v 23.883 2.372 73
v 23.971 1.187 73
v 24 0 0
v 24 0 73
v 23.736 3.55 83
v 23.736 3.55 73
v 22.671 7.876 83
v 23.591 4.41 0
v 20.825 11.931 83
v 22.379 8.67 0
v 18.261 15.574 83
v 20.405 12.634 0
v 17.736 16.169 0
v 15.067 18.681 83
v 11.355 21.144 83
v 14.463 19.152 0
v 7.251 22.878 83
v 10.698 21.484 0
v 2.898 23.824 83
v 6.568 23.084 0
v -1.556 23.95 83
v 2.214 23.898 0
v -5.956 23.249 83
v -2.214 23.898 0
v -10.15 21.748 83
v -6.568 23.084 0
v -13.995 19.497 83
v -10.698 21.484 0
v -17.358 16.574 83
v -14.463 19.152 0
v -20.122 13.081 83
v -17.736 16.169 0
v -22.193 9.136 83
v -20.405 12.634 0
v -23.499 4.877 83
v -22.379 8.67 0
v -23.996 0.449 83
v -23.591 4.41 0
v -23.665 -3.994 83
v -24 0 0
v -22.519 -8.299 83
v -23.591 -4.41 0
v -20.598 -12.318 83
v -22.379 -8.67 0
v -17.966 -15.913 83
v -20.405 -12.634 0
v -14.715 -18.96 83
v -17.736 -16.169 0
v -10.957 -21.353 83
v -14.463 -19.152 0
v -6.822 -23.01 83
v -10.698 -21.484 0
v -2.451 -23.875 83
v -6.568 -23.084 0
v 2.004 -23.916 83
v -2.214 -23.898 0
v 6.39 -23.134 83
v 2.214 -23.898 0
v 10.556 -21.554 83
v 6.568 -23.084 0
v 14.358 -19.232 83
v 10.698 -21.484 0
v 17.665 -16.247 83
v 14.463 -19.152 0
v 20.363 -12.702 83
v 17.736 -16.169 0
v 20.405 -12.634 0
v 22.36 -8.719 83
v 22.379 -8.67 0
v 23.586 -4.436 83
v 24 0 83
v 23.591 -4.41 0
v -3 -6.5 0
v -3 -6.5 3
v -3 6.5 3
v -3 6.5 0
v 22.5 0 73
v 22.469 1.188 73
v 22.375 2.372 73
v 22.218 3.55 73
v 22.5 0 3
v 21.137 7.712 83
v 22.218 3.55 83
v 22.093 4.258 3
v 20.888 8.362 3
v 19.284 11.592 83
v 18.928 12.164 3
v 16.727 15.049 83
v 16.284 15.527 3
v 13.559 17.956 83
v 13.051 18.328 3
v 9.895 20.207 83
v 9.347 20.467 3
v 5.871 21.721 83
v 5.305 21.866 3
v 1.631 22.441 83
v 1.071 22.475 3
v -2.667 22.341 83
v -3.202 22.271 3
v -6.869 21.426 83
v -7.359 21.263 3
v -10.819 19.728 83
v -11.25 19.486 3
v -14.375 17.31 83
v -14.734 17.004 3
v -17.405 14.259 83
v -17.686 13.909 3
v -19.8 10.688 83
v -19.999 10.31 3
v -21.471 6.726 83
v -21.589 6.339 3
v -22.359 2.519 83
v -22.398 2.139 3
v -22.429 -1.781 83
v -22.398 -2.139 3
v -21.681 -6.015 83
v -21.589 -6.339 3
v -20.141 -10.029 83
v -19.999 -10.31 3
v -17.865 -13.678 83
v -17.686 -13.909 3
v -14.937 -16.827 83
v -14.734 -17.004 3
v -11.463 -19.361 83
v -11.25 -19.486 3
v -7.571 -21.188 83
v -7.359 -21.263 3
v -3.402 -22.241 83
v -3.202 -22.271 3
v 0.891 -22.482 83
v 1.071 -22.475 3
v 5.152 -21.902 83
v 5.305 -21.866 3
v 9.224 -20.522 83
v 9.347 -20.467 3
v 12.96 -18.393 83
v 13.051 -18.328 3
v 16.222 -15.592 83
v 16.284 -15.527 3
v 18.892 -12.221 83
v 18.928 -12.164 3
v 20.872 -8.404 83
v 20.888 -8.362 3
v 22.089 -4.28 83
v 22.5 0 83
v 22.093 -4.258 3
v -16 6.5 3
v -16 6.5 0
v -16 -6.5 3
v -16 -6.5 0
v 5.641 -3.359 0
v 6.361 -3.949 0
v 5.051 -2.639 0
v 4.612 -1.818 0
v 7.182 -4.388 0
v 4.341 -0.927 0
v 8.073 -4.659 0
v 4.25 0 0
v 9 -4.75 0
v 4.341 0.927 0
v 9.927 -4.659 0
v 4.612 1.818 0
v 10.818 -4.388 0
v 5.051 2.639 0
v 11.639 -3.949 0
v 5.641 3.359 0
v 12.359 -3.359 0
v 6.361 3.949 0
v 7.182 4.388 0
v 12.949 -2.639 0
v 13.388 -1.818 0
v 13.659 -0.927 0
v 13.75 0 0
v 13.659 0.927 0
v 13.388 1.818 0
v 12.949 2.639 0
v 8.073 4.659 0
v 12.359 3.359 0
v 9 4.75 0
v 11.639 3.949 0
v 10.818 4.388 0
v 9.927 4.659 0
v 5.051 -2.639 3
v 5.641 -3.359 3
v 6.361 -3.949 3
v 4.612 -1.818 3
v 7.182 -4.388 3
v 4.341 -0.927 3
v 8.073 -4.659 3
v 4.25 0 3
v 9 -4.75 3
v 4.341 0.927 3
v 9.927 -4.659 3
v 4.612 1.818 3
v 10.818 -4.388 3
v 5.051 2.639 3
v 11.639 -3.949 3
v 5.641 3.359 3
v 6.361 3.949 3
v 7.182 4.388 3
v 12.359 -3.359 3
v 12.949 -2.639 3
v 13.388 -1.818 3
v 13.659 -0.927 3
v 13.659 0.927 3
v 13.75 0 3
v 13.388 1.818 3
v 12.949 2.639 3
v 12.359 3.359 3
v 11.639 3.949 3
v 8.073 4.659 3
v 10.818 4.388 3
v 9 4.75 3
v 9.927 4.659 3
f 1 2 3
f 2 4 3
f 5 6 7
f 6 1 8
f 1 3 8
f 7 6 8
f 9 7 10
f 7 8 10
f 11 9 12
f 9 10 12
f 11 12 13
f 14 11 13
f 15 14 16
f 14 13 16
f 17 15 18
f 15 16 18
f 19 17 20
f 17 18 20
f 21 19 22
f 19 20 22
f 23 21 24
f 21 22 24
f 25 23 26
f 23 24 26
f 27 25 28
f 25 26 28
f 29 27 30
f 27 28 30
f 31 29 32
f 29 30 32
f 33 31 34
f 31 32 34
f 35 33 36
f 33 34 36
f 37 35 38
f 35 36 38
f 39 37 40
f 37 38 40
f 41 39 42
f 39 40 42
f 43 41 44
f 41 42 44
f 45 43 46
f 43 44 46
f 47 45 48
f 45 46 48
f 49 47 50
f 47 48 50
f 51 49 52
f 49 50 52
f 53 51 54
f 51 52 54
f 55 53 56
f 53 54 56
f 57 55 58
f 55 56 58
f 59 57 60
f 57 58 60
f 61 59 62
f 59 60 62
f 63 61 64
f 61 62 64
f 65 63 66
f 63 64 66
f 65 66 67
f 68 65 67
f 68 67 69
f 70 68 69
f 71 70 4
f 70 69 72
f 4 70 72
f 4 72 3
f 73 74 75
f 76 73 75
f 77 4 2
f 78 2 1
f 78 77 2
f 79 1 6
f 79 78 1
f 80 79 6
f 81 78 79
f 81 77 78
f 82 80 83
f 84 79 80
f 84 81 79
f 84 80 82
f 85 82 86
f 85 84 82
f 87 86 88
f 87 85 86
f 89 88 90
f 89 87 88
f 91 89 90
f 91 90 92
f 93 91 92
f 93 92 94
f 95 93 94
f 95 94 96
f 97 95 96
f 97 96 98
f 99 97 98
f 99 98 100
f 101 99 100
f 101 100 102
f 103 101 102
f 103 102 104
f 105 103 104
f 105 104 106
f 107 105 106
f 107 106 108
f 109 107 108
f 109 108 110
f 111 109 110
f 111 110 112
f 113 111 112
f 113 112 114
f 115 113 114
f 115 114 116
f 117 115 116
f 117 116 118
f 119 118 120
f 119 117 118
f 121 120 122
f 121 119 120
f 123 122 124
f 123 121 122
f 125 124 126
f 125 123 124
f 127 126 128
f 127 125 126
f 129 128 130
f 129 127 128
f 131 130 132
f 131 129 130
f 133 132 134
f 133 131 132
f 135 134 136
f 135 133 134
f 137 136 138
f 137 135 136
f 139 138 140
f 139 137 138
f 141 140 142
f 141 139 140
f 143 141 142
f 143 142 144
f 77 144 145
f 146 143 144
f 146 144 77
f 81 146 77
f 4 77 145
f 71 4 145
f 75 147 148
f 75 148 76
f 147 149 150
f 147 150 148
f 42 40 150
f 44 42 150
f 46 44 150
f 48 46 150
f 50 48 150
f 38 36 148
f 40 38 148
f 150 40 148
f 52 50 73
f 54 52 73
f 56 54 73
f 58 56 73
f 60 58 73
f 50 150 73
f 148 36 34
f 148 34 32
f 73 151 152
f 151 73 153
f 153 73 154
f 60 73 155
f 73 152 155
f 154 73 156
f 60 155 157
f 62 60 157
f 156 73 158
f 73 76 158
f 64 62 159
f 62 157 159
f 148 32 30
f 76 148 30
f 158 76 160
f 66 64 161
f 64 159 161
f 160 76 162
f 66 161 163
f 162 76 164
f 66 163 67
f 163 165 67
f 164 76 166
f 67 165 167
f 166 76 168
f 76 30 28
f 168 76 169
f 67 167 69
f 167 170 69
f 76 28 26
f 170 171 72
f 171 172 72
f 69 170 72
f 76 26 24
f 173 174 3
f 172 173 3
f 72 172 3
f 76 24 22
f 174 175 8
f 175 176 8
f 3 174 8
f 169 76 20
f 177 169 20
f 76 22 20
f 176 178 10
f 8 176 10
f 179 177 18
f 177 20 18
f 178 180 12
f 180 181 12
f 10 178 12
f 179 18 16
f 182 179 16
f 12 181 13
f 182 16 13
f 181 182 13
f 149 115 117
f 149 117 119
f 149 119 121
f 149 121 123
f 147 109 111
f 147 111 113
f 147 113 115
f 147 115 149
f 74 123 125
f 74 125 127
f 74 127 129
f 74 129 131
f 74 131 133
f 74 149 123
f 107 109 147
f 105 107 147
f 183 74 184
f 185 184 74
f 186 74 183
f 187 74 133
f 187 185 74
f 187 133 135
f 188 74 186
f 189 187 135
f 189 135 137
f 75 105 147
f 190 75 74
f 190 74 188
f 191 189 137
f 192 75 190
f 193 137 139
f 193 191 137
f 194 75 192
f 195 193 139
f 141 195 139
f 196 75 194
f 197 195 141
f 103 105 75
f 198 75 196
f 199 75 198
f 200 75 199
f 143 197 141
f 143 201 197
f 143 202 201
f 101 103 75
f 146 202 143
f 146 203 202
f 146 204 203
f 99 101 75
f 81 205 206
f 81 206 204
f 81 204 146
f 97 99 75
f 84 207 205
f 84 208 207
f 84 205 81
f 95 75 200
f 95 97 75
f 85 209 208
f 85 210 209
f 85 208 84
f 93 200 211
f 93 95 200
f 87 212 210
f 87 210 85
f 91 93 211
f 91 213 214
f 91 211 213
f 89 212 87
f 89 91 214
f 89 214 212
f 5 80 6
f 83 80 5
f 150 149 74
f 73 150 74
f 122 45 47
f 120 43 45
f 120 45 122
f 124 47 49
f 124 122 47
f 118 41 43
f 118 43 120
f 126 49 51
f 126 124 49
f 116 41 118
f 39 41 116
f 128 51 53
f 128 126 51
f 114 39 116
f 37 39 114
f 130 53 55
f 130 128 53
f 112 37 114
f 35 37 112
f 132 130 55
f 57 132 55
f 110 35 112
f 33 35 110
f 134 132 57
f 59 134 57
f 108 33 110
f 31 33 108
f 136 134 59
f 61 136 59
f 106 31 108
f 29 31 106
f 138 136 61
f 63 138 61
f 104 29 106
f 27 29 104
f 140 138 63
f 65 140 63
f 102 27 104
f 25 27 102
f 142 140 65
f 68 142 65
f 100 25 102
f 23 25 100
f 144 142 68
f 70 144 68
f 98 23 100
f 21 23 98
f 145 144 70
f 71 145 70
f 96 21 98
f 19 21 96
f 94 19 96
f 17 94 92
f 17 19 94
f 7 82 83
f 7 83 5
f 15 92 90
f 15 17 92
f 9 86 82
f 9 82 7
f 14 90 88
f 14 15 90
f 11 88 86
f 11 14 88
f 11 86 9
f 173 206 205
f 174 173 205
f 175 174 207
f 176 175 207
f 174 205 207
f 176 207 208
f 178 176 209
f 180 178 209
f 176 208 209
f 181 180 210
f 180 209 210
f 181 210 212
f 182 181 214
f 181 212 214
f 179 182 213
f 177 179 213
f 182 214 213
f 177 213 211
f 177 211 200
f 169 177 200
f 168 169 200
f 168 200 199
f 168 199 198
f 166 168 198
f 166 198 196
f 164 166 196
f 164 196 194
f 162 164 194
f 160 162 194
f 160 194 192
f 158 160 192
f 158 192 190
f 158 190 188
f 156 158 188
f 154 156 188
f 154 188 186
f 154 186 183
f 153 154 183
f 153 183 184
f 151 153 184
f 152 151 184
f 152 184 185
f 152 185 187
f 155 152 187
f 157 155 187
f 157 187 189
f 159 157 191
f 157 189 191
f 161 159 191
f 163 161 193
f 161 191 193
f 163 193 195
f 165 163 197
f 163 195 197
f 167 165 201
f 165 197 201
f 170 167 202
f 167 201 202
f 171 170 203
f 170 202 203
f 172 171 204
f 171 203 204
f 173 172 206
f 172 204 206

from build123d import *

# Parameters (mm, degrees)
F0_R     = 24
F1_DEPTH = 3
F2_R     = 24
F2_R_2   = 22.5
F3_DEPTH = 80
F4_W     = 13
F4_H     = 13
F4_R     = 4.75
F5_DEPTH = 3.001
F6_W     = 3.55
F6_H     = 10
F7_DEPTH = 25


with BuildPart() as f1:
    # F0 (on Top) → F1 (new body)
    with BuildSketch(Plane.XY):
        Circle(F0_R)
    extrude(amount=F1_DEPTH)

    # F2 (on face) → F3 (join)
    with BuildSketch(Plane.XY.offset(3)):
        Circle(F2_R)
        Circle(F2_R_2, mode=Mode.SUBTRACT)
    extrude(amount=F3_DEPTH)

    # F4 (on face) → F5 (cut, through all)
    with BuildSketch(Plane.XY.offset(3)):
        with Locations((-9.5, 0)):
            Rectangle(F4_W, F4_H)
        with Locations((9, 0)):
            Circle(F4_R)
    extrude(amount=-F5_DEPTH, mode=Mode.SUBTRACT)

    # F6 (on Right) → F7 (cut)
    with BuildSketch(Plane.YZ):
        with Locations((1.775, 78)):
            Rectangle(F6_W, F6_H)
    extrude(amount=F7_DEPTH, mode=Mode.SUBTRACT)


solid = f1.part
